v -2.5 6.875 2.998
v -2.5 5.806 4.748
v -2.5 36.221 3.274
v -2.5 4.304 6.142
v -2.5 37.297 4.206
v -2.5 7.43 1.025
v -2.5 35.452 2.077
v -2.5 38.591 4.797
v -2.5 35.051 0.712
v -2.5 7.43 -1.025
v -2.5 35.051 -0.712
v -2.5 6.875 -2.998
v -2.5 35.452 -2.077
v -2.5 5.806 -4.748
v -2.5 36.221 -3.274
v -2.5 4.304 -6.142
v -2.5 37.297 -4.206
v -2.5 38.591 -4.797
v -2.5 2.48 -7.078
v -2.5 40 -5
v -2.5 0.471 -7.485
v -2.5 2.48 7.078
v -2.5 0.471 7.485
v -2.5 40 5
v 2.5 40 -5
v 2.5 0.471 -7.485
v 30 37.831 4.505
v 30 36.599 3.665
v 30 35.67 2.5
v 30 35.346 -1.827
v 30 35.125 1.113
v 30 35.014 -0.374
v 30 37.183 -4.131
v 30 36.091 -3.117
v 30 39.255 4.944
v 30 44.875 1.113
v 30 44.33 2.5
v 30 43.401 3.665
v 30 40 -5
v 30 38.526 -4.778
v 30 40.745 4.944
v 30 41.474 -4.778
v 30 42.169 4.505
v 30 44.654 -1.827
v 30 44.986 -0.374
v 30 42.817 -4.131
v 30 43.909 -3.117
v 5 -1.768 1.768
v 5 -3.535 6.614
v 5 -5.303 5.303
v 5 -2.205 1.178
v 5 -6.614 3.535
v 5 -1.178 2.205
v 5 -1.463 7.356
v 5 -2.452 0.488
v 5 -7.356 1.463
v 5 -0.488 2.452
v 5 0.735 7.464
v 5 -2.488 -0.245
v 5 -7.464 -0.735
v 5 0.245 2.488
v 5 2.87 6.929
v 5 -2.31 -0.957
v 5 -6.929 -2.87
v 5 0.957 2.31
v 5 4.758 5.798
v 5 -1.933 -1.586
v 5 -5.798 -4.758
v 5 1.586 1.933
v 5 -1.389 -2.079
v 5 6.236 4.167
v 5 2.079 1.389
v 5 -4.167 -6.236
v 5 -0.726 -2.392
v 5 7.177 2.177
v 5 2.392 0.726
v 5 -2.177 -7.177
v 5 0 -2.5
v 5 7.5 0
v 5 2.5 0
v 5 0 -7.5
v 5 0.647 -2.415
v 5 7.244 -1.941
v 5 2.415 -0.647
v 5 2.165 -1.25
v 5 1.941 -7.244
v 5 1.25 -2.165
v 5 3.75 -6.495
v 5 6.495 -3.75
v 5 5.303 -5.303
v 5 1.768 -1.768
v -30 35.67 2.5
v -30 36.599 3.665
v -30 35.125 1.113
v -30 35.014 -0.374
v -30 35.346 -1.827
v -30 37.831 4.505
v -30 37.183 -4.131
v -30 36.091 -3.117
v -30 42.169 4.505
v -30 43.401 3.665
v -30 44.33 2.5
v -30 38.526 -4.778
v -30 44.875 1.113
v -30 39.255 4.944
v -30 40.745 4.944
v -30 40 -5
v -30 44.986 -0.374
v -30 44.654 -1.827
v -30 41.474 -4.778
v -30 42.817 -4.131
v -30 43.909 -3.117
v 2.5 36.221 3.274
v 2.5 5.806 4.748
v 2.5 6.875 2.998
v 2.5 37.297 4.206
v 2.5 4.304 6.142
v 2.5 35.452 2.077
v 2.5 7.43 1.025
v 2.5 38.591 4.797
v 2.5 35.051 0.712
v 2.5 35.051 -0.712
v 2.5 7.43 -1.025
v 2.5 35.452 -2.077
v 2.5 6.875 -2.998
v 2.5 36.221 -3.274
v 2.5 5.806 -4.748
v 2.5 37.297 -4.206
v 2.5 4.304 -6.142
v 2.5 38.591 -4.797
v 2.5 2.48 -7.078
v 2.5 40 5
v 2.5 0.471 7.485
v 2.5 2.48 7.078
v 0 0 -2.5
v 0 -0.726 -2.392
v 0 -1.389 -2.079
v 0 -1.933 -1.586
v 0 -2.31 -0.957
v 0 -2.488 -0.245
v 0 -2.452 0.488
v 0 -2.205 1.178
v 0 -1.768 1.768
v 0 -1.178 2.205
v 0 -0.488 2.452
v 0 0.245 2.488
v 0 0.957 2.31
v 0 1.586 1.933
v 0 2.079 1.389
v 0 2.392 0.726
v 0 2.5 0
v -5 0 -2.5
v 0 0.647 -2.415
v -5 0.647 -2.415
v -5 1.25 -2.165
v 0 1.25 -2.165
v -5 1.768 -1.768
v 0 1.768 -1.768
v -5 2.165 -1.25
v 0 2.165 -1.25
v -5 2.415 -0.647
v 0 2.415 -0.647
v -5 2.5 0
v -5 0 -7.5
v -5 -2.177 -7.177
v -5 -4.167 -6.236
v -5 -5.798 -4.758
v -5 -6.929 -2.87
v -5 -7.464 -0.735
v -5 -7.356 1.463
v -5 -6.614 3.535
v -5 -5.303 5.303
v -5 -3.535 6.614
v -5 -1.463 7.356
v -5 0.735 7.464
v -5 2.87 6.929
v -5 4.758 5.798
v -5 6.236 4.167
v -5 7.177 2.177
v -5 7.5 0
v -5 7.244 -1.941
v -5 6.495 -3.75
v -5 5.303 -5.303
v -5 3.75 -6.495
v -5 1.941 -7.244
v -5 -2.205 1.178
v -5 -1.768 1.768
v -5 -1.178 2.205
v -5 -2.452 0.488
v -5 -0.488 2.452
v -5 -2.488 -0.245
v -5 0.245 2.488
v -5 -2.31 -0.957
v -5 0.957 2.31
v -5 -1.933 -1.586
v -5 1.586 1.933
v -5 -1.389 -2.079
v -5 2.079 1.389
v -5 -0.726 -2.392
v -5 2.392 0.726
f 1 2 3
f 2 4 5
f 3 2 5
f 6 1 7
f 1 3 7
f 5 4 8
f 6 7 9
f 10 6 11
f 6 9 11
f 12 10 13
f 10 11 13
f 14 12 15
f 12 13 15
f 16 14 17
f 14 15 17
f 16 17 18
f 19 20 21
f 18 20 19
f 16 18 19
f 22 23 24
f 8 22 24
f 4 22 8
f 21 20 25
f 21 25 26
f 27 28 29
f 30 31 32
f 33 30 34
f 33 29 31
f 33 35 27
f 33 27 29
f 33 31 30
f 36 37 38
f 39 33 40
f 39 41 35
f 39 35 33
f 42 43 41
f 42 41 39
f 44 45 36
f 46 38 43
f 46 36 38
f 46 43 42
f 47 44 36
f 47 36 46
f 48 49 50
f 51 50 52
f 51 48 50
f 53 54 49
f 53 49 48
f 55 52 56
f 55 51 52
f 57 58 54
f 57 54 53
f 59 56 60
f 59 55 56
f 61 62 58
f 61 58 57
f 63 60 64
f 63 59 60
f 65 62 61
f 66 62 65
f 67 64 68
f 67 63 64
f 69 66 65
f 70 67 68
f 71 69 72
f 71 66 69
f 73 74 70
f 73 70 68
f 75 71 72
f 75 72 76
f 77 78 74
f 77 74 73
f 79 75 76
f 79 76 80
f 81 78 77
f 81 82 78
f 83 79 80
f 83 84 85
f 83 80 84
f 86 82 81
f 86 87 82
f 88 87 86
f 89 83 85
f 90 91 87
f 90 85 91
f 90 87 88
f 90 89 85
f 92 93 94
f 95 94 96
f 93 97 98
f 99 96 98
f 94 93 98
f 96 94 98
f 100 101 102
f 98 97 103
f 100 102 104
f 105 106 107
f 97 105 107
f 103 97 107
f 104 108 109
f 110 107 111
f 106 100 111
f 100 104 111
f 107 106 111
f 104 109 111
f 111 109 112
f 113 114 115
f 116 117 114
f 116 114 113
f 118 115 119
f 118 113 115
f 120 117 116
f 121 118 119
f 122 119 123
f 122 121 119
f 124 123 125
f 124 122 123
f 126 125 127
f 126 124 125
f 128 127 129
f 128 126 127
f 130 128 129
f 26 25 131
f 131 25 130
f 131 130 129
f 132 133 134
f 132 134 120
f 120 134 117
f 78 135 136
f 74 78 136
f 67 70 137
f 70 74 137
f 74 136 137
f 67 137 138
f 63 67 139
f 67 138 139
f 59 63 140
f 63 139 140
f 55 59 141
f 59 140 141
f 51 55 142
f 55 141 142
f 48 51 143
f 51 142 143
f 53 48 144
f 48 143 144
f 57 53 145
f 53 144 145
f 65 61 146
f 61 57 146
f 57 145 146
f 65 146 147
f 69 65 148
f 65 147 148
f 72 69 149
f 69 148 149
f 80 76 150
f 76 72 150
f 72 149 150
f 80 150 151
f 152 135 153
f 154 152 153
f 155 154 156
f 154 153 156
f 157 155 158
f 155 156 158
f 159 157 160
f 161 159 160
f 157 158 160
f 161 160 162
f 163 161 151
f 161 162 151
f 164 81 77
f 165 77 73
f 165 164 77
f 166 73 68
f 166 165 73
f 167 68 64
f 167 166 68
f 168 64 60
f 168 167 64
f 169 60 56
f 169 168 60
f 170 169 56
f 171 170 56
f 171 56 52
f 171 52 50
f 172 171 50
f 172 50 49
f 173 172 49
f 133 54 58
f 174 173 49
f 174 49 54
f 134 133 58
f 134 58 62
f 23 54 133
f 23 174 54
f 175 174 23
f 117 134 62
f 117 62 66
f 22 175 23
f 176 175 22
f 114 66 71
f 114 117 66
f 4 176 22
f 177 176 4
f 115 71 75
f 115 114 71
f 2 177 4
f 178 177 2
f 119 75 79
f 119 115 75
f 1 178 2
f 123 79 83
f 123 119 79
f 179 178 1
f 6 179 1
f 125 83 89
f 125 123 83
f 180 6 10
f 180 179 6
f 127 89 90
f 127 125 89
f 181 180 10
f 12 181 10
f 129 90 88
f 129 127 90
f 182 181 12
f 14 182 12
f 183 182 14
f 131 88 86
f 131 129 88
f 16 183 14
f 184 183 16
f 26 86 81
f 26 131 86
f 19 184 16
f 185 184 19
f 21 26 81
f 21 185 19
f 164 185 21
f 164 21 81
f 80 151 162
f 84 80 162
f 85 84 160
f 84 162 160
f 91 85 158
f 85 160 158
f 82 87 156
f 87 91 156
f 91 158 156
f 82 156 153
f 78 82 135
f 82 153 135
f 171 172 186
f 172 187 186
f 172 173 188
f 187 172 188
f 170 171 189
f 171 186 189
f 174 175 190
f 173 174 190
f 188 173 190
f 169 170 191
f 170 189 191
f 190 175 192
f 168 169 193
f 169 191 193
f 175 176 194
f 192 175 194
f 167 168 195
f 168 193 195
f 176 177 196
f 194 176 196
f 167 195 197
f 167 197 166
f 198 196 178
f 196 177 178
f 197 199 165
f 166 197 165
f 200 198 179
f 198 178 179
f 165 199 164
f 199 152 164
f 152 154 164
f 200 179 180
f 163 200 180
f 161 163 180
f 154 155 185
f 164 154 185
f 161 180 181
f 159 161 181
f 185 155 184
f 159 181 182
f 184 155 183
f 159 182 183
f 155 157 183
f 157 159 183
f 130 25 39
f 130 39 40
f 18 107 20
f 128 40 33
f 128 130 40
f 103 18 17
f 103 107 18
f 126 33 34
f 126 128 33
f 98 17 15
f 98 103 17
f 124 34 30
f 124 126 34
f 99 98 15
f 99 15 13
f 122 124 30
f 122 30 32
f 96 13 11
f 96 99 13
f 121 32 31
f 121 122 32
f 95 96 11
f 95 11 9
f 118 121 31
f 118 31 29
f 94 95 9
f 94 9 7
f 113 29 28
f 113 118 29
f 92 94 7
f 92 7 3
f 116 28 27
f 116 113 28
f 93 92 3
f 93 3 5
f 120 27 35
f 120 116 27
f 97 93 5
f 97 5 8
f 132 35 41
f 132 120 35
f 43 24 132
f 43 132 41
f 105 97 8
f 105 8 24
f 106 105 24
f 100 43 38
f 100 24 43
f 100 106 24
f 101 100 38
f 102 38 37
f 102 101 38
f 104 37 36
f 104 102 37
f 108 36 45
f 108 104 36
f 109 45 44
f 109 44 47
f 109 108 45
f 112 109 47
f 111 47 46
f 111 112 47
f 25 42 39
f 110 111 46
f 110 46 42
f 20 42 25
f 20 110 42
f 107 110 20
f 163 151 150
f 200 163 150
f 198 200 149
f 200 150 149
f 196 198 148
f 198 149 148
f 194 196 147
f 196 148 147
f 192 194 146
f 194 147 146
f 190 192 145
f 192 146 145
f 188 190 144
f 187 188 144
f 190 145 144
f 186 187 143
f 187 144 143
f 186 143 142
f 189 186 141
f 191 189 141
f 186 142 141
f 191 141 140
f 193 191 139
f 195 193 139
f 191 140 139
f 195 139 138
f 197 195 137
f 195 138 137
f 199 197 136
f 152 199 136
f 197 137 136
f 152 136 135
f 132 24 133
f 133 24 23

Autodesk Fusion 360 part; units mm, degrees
sketch "Sketch1" plane through (0, 0, 0) normal (1, 0, 0) x (0, 0, -1)
  circle A0 centre (0, 0) radius 2.5
  circle A1 centre (0, 0) radius 7.5
  line L0 (0, 0) -> (0, 40)
  circle A2 centre (0, 40) radius 5
  line L1 (-5, 40) -> (-7.4852, 0.4706)
  line L2 (5, 40) -> (7.4852, 0.4706)
  dimension "d1" = 5
  dimension "d2" = 5
  dimension "d3" = 40
  dimension "d4" = 10
  dimension "d5" = 39.5294
  dimension "d6" = 39.5294
extrude "Extrude1" add sketch "Sketch1" along normal mid plane 10 contours A1
extrude "Extrude2" add sketch "Sketch1" along normal mid plane 5 contours A1 L0 A2 L1 | A1 L0 A2 L2
extrude "Extrude3" add sketch "Sketch1" along normal mid plane 60 contours A2
